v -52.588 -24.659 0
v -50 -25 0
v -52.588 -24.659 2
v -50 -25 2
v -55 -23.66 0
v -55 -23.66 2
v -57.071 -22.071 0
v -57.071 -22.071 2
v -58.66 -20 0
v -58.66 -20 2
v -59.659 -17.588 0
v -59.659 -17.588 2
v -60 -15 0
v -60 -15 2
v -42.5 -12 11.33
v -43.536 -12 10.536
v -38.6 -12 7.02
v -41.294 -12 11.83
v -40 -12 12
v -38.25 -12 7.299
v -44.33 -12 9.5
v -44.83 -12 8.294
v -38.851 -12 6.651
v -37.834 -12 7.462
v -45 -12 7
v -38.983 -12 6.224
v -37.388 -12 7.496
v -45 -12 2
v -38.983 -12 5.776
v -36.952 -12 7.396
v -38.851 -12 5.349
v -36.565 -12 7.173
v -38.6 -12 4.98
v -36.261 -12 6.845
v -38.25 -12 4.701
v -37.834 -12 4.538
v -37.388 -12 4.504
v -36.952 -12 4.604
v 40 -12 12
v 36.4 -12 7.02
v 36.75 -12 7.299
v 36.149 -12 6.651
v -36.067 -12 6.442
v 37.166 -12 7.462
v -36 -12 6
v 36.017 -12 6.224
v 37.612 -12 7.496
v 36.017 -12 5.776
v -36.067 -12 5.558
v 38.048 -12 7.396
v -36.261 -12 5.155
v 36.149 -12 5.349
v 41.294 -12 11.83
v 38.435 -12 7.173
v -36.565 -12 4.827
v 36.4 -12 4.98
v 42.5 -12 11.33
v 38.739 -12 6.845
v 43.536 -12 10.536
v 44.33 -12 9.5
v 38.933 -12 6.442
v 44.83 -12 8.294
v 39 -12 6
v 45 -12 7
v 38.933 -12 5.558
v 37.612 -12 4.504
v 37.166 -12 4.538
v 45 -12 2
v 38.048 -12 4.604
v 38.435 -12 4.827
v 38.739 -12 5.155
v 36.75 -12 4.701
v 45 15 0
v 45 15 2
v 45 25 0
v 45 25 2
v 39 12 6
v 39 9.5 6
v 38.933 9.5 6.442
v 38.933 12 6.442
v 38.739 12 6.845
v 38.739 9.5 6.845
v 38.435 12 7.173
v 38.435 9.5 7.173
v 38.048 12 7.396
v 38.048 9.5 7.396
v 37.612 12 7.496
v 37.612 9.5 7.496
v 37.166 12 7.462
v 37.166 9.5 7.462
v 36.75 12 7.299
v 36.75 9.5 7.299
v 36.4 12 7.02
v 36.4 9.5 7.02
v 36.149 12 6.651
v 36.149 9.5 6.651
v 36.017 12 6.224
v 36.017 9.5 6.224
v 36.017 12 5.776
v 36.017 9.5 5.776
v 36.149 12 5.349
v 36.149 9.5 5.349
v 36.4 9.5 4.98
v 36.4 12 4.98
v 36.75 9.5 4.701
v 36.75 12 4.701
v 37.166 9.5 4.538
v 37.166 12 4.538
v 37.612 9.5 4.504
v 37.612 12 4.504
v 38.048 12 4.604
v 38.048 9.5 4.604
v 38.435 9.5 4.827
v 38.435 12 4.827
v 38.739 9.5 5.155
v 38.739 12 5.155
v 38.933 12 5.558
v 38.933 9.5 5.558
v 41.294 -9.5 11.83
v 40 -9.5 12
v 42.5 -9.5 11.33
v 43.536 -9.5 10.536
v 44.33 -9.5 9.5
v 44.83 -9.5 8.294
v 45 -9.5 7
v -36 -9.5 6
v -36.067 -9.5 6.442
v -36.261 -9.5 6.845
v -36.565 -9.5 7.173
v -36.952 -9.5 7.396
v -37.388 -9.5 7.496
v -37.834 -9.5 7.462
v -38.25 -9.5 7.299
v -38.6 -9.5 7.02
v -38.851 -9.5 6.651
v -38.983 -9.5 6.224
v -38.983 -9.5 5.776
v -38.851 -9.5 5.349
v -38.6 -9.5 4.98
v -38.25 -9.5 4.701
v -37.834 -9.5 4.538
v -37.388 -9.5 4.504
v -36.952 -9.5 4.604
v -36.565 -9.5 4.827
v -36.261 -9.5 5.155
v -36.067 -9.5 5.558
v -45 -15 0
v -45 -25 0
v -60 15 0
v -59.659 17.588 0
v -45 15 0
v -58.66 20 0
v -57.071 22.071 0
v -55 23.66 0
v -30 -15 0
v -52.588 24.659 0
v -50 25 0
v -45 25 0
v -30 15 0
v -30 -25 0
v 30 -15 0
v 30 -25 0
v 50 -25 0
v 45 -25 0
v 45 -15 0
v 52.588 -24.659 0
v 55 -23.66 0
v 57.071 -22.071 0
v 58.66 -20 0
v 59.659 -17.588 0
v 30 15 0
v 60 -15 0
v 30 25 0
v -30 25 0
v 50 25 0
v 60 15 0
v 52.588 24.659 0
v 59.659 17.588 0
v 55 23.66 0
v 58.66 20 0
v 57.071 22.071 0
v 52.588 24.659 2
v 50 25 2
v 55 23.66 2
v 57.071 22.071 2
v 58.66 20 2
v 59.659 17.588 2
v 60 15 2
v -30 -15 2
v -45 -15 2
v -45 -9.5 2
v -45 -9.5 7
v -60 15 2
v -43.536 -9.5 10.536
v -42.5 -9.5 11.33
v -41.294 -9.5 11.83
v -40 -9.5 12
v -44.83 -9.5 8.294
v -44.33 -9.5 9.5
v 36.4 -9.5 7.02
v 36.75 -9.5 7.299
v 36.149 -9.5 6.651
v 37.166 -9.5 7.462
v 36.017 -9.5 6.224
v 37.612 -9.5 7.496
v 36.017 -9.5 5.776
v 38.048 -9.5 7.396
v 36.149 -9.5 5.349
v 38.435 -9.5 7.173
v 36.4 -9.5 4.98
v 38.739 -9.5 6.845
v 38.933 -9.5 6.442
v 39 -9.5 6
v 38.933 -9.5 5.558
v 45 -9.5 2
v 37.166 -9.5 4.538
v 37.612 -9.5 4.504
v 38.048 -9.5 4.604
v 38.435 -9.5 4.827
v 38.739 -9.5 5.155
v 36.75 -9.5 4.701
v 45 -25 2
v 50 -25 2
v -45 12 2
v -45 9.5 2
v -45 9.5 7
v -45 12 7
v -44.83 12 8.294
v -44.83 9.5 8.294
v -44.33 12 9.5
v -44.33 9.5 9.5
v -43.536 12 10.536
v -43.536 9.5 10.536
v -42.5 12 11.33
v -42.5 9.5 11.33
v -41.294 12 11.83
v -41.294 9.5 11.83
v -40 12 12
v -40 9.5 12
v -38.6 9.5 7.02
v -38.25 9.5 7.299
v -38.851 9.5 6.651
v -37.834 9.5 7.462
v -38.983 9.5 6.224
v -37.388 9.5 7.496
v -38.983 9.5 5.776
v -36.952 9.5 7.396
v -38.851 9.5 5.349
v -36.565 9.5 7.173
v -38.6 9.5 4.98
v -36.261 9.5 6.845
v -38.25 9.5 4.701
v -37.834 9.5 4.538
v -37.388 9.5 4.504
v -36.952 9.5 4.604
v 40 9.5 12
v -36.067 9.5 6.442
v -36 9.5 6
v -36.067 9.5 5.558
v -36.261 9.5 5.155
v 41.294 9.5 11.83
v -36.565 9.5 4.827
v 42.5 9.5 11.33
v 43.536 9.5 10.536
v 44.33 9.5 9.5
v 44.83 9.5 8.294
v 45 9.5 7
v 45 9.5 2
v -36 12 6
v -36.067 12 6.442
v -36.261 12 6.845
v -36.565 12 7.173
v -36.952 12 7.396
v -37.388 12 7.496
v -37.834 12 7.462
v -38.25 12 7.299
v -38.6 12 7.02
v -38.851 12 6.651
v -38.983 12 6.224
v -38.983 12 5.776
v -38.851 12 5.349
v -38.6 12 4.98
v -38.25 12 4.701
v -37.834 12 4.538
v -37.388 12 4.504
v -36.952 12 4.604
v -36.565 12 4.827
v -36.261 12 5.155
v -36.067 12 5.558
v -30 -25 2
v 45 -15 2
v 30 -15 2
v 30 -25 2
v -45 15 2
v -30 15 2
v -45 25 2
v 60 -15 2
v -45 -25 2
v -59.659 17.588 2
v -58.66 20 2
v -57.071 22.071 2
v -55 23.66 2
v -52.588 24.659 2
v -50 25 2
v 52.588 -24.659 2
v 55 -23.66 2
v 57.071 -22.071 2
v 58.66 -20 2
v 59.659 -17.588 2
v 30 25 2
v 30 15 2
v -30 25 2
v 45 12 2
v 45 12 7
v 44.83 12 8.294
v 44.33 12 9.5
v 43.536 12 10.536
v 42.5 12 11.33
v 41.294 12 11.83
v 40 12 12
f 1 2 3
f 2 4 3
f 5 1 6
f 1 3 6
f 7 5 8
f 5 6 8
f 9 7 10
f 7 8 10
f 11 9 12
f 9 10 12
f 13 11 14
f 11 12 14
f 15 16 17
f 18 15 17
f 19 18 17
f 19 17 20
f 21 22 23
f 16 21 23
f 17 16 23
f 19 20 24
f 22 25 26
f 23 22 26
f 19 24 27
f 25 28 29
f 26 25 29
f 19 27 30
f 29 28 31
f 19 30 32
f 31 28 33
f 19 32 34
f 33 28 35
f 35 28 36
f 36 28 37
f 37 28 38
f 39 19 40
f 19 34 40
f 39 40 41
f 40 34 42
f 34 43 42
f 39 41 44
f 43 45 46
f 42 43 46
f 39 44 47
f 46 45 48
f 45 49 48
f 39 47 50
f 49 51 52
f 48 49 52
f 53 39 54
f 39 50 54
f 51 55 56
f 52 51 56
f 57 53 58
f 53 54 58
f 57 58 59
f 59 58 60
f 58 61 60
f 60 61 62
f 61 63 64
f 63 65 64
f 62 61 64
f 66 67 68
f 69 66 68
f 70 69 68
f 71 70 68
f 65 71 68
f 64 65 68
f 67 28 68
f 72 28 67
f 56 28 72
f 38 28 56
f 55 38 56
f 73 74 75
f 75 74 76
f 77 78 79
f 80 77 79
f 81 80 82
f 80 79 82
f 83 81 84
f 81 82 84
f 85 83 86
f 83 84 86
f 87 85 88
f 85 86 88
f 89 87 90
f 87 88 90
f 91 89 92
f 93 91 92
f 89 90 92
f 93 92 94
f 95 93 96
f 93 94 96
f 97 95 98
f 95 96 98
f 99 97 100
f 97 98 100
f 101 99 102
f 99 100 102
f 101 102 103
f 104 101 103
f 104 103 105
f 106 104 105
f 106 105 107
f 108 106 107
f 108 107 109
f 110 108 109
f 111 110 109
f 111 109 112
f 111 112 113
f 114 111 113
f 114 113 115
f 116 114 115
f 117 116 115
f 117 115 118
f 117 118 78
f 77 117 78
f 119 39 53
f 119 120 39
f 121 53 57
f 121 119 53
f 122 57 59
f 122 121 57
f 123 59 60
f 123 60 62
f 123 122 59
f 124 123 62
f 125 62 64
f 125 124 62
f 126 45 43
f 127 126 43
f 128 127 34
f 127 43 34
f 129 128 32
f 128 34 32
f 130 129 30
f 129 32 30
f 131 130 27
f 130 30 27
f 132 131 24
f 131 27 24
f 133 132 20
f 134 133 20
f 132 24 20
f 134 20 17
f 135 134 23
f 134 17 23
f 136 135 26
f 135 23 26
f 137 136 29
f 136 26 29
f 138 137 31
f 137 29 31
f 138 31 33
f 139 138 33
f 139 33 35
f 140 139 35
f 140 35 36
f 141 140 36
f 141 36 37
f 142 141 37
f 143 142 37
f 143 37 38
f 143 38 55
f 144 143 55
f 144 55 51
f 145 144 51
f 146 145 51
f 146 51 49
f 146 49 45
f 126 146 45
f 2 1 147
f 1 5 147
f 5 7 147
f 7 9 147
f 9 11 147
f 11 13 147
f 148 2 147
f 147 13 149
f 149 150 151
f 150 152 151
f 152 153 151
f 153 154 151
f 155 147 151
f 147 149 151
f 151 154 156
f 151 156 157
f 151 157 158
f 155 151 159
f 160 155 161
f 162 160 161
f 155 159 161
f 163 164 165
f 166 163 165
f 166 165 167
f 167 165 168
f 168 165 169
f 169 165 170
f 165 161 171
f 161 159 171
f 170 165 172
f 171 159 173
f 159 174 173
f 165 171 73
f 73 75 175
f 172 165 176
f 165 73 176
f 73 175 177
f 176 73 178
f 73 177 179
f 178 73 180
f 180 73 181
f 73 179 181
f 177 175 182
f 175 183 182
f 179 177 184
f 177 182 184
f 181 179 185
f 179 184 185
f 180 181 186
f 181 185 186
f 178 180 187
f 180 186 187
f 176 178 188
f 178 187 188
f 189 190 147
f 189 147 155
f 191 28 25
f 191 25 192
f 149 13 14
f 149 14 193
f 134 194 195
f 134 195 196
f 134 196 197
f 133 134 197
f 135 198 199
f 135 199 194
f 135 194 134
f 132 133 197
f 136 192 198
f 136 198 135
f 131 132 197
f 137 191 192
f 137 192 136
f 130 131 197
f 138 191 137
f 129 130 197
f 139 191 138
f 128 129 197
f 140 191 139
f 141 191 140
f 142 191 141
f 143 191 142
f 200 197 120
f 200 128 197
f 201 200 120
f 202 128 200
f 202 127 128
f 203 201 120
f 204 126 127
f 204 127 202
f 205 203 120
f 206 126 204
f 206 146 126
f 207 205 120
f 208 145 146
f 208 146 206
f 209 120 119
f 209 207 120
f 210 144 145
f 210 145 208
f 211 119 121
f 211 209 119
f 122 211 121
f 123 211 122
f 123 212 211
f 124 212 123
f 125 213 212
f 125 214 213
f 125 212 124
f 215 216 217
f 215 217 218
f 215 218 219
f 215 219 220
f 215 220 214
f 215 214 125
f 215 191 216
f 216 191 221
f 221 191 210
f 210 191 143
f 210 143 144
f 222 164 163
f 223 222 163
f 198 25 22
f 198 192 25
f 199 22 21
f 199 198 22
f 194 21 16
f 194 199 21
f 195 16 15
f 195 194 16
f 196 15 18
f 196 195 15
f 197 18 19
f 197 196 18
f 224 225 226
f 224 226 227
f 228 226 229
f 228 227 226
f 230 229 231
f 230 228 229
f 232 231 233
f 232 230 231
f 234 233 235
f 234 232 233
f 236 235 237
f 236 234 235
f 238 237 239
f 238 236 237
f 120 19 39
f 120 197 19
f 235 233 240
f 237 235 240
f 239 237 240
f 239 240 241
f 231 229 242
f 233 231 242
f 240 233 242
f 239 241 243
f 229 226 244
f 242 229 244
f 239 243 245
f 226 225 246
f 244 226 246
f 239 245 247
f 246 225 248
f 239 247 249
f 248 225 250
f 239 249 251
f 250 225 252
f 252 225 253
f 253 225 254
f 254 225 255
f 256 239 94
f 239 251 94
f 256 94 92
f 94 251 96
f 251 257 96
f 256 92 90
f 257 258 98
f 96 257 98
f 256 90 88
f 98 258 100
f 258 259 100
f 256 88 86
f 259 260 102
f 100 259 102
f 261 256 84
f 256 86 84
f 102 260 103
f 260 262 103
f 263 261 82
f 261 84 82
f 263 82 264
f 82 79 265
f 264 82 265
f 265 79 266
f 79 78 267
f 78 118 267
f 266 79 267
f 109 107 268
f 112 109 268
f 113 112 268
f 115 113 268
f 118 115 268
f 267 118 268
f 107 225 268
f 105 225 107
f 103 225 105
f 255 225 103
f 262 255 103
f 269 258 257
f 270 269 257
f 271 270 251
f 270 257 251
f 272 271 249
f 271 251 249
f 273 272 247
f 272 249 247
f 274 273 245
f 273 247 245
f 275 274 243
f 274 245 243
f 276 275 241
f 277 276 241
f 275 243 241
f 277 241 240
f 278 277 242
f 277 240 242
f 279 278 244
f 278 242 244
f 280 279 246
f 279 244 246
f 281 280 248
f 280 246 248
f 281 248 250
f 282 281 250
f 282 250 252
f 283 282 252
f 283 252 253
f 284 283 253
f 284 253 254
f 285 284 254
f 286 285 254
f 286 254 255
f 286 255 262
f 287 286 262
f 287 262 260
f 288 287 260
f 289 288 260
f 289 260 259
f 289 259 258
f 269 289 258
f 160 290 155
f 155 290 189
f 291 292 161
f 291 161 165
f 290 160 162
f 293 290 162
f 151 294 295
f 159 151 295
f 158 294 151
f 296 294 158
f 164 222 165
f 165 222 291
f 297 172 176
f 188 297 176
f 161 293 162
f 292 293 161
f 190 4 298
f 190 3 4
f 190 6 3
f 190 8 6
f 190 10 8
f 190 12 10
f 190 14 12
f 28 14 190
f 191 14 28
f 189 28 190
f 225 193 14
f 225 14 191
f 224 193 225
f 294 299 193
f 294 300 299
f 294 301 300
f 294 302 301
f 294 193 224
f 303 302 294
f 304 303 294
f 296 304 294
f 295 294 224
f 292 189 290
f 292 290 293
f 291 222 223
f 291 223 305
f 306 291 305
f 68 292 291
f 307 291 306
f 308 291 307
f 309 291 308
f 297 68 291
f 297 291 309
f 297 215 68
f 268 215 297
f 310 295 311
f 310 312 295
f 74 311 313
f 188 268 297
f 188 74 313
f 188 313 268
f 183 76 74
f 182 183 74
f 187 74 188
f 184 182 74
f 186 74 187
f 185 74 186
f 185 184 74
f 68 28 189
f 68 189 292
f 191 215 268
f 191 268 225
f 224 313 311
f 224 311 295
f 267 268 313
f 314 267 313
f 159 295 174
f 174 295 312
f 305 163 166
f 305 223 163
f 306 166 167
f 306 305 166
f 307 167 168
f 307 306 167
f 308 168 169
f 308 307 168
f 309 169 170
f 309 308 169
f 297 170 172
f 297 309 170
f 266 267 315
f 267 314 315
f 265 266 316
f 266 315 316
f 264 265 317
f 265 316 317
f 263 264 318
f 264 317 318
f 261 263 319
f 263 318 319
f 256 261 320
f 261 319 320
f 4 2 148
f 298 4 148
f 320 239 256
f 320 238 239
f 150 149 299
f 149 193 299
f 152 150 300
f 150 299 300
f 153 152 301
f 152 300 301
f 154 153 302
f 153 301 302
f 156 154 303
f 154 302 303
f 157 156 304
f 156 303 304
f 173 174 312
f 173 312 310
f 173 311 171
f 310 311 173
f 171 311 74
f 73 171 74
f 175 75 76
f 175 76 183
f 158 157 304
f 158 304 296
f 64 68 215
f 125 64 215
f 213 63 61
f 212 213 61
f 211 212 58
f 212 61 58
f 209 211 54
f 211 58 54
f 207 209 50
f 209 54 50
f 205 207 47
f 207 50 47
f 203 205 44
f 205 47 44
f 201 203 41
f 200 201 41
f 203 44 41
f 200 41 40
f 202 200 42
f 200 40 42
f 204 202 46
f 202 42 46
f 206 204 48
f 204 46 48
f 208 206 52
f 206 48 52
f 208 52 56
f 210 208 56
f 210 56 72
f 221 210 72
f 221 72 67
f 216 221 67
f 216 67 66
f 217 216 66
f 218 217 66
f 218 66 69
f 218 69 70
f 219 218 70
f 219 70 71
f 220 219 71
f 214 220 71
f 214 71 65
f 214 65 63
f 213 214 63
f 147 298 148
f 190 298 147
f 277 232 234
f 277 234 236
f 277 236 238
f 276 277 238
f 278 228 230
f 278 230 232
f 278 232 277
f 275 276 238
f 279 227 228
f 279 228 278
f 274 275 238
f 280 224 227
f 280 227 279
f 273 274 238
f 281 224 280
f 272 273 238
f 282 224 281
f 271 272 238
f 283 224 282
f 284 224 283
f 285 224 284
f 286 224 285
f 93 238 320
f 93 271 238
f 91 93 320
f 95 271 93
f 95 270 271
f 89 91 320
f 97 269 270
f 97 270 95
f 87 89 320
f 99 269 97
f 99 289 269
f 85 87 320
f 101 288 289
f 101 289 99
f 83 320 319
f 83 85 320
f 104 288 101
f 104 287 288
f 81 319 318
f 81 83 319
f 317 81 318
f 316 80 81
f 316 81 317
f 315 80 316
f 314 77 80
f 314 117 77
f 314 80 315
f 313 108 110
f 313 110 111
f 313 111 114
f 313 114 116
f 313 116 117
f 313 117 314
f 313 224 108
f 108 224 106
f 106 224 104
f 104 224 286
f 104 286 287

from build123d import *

# Parameters (mm, degrees)
F0_W      = 120
F0_H      = 50
F1_DEPTH  = 2
F2_W      = 15
F2_H      = 10
F3_DEPTH  = 25
F4_W      = 15
F4_H      = 10
F5_DEPTH  = 12.5
F6_W      = 15
F6_H      = 10
F7_DEPTH  = 25
F8_W      = 15
F8_H      = 10
F9_DEPTH  = 25
F10_W     = 90
F10_H     = 2.5
F11_DEPTH = 10
F12_W     = 90
F12_H     = 2.5
F13_DEPTH = 10
F14_R     = 5
F15_R     = 5
F16_R     = 10
F17_R     = 10
F18_R     = 1.5
F19_DEPTH = 37.001
F20_DEPTH = 25


with BuildPart() as f1:
    # F0 (on Top) → F1 (new body)
    with BuildSketch(Plane.XY):
        Rectangle(F0_W, F0_H)
    extrude(amount=F1_DEPTH)

    # F2 (on face) → F3 (cut)
    with BuildSketch(Plane.XY.offset(2)):
        with Locations((37.5, -20)):
            Rectangle(F2_W, F2_H)
    extrude(amount=-F3_DEPTH, mode=Mode.SUBTRACT)

    # F4 (on face) → F5 (cut, symmetric)
    with BuildSketch(Plane.XY.offset(2)):
        with Locations((37.5, 20)):
            Rectangle(F4_W, F4_H)
    extrude(amount=F5_DEPTH, both=True, mode=Mode.SUBTRACT)

    # F6 (on face) → F7 (cut)
    with BuildSketch(Plane.XY.offset(2)):
        with Locations((-37.5, 20)):
            Rectangle(F6_W, F6_H)
    extrude(amount=-F7_DEPTH, mode=Mode.SUBTRACT)

    # F8 (on face) → F9 (cut)
    with BuildSketch(Plane.XY.offset(2)):
        with Locations((-37.5, -20)):
            Rectangle(F8_W, F8_H)
    extrude(amount=-F9_DEPTH, mode=Mode.SUBTRACT)

    # F10 (on face) → F11 (join)
    with BuildSketch(Plane.XY.offset(2)):
        with Locations((0, -10.75)):
            Rectangle(F10_W, F10_H)
    extrude(amount=F11_DEPTH)

    # F12 (on face) → F13 (join)
    with BuildSketch(Plane.XY.offset(2)):
        with Locations((0, 10.75)):
            Rectangle(F12_W, F12_H)
    extrude(amount=F13_DEPTH)

    # F14
    f14_edges = [f1.edges().sort_by_distance(p)[0] for p in [
        (-45, -10.75, 12),
    ]]
    fillet(f14_edges, radius=F14_R)

    # F15
    f15_edges = [f1.edges().sort_by_distance(p)[0] for p in [
        (45, 10.75, 12),
        (-45, 10.75, 12),
        (45, -10.75, 12),
    ]]
    fillet(f15_edges, radius=F15_R)

    # F16
    f16_edges = [f1.edges().sort_by_distance(p)[0] for p in [
        (60, -25, 1),
        (60, 25, 1),
    ]]
    fillet(f16_edges, radius=F16_R)

    # F17
    f17_edges = [f1.edges().sort_by_distance(p)[0] for p in [
        (-60, -25, 1),
        (-60, 25, 1),
    ]]
    fillet(f17_edges, radius=F17_R)

    # F18 (on face) → F19 (cut, through all)
    with BuildSketch(Plane.XZ.offset(12)):
        with Locations((-37.5, 6)):
            Circle(F18_R)
    extrude(amount=-F19_DEPTH, mode=Mode.SUBTRACT)

    # F18 (on face) → F20 (cut)
    with BuildSketch(Plane.XZ.offset(12)):
        with Locations((-37.5, 6)):
            Circle(F18_R)
        with Locations((37.5, 6)):
            Circle(F18_R)
    extrude(amount=-F20_DEPTH, mode=Mode.SUBTRACT)


solid = f1.part
